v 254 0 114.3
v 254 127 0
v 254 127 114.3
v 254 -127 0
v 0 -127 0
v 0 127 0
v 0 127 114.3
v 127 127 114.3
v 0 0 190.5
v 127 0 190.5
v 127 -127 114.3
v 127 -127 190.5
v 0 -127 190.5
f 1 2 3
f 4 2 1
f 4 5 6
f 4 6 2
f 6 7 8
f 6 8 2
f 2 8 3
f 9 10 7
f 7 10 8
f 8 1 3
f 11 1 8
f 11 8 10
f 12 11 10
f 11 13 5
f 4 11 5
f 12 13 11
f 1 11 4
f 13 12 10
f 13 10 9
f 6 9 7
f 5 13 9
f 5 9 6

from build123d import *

# Parameters (mm, degrees)
F1_DEPTH = 127
F3_DEPTH = 254
F7_DEPTH = 117.6922930425


with BuildPart() as f1:
    # F0 (on Front) → F1 (new body, symmetric)
    with BuildSketch(Plane.XZ):
        Polygon((0, 190.5), (0, 0), (254, 0), (254, 114.3), (127, 114.3), (127, 190.5), align=None)
    extrude(amount=F1_DEPTH, both=True)

    # F2 (on face) → F3 (cut)
    with BuildSketch(Plane.YZ.offset(127)):
        Polygon((127, 190.5), (0, 190.5), (127, 114.3), align=None)
    extrude(amount=-F3_DEPTH, mode=Mode.SUBTRACT)

    # F6 (on 3pt) → F7 (cut, through all)
    with BuildSketch(Plane(origin=(117.7900763359, -117.7900763359, 130.8778625954), x_dir=(0.8311676694, 0.3719590123, -0.4132877914), z_dir=(0.5560218569, -0.5560218569, 0.6178020632))):
        Polygon((163.877793469, -94.3983565734), (163.877793469, 76.4626688244), (11.0807048965, -17.9356877489), align=None)
    extrude(amount=F7_DEPTH, mode=Mode.SUBTRACT)


solid = f1.part
